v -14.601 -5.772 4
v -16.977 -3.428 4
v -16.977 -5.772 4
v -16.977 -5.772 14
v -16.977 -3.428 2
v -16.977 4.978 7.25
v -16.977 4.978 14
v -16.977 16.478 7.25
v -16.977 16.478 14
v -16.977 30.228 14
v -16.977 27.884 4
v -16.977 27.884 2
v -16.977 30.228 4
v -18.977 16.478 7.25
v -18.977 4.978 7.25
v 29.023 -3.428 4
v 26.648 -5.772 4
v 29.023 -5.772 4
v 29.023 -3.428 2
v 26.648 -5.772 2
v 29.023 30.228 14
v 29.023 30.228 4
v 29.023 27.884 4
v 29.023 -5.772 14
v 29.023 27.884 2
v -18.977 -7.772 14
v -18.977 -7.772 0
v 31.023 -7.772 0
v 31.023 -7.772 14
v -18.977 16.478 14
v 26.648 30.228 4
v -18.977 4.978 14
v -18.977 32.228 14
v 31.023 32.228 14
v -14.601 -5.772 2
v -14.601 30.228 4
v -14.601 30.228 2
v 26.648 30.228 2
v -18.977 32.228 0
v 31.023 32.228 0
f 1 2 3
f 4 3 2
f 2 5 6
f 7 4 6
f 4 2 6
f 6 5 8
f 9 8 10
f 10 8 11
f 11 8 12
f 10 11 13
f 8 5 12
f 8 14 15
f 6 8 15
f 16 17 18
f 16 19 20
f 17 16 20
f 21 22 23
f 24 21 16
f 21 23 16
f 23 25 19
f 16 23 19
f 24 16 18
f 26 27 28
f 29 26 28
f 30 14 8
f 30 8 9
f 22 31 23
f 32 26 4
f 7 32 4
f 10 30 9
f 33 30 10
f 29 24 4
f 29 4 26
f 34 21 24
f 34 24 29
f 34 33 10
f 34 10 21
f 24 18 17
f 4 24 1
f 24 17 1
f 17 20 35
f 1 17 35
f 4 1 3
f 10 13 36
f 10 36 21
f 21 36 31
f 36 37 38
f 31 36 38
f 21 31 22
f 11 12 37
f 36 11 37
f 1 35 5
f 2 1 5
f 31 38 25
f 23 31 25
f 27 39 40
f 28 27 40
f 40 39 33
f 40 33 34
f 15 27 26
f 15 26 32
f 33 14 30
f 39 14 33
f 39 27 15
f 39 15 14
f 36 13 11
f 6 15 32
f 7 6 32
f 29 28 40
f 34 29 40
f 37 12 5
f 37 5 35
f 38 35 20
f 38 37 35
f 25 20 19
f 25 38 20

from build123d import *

# Parameters (mm, degrees)
F1_DEPTH = 2
F2_DEPTH = 4
F0_W     = 50
F0_H     = 40
F3_DEPTH = 14
F4_W     = 11.5
F4_H     = 6.75
F5_DEPTH = 25


with BuildPart() as f1:
    # F0 (on Top) → F1 (new body)
    with BuildSketch(Plane.XY):
        Polygon((29.023395, 27.884433), (26.64808, 30.228337), (-14.601289, 30.228337), (-16.976605, 27.884433), (-16.976605, -3.427759), (-14.601289, -5.771663), (26.64808, -5.771663), (29.023395, -3.427759), align=None)
    extrude(amount=F1_DEPTH)

    # F0 (on Top) → F2 (join)
    with BuildSketch(Plane.XY):
        Polygon((-14.601289, -5.771663), (-16.976605, -3.427759), (-16.976605, -5.771663), align=None)
        Polygon((29.023395, -5.771663), (29.023395, -3.427759), (26.64808, -5.771663), align=None)
        Polygon((-16.976605, 27.884433), (-14.601289, 30.228337), (-16.976605, 30.228337), align=None)
        Polygon((29.023395, 27.884433), (29.023395, 30.228337), (26.64808, 30.228337), align=None)
    extrude(amount=F2_DEPTH)

    # F0 (on Top) → F3 (join)
    with BuildSketch(Plane.XY):
        with Locations((6.023395, 12.228337)):
            Rectangle(F0_W, F0_H)
        Polygon((26.64808, 30.228337), (29.023395, 30.228337), (29.023395, 27.884433), (29.023395, -3.427759), (29.023395, -5.771663), (26.64808, -5.771663), (-14.601289, -5.771663), (-16.976605, -5.771663), (-16.976605, -3.427759), (-16.976605, 27.884433), (-16.976605, 30.228337), (-14.601289, 30.228337), align=None, mode=Mode.SUBTRACT)
    extrude(amount=F3_DEPTH)

    # F4 (on face) → F5 (cut)
    with BuildSketch(Plane(origin=(-18.976605, 0, 0), x_dir=(0, -1, 0), z_dir=(-1, 0, 0))):
        with Locations((-10.728337, 10.625)):
            Rectangle(F4_W, F4_H)
    extrude(amount=-F5_DEPTH, mode=Mode.SUBTRACT)


solid = f1.part
